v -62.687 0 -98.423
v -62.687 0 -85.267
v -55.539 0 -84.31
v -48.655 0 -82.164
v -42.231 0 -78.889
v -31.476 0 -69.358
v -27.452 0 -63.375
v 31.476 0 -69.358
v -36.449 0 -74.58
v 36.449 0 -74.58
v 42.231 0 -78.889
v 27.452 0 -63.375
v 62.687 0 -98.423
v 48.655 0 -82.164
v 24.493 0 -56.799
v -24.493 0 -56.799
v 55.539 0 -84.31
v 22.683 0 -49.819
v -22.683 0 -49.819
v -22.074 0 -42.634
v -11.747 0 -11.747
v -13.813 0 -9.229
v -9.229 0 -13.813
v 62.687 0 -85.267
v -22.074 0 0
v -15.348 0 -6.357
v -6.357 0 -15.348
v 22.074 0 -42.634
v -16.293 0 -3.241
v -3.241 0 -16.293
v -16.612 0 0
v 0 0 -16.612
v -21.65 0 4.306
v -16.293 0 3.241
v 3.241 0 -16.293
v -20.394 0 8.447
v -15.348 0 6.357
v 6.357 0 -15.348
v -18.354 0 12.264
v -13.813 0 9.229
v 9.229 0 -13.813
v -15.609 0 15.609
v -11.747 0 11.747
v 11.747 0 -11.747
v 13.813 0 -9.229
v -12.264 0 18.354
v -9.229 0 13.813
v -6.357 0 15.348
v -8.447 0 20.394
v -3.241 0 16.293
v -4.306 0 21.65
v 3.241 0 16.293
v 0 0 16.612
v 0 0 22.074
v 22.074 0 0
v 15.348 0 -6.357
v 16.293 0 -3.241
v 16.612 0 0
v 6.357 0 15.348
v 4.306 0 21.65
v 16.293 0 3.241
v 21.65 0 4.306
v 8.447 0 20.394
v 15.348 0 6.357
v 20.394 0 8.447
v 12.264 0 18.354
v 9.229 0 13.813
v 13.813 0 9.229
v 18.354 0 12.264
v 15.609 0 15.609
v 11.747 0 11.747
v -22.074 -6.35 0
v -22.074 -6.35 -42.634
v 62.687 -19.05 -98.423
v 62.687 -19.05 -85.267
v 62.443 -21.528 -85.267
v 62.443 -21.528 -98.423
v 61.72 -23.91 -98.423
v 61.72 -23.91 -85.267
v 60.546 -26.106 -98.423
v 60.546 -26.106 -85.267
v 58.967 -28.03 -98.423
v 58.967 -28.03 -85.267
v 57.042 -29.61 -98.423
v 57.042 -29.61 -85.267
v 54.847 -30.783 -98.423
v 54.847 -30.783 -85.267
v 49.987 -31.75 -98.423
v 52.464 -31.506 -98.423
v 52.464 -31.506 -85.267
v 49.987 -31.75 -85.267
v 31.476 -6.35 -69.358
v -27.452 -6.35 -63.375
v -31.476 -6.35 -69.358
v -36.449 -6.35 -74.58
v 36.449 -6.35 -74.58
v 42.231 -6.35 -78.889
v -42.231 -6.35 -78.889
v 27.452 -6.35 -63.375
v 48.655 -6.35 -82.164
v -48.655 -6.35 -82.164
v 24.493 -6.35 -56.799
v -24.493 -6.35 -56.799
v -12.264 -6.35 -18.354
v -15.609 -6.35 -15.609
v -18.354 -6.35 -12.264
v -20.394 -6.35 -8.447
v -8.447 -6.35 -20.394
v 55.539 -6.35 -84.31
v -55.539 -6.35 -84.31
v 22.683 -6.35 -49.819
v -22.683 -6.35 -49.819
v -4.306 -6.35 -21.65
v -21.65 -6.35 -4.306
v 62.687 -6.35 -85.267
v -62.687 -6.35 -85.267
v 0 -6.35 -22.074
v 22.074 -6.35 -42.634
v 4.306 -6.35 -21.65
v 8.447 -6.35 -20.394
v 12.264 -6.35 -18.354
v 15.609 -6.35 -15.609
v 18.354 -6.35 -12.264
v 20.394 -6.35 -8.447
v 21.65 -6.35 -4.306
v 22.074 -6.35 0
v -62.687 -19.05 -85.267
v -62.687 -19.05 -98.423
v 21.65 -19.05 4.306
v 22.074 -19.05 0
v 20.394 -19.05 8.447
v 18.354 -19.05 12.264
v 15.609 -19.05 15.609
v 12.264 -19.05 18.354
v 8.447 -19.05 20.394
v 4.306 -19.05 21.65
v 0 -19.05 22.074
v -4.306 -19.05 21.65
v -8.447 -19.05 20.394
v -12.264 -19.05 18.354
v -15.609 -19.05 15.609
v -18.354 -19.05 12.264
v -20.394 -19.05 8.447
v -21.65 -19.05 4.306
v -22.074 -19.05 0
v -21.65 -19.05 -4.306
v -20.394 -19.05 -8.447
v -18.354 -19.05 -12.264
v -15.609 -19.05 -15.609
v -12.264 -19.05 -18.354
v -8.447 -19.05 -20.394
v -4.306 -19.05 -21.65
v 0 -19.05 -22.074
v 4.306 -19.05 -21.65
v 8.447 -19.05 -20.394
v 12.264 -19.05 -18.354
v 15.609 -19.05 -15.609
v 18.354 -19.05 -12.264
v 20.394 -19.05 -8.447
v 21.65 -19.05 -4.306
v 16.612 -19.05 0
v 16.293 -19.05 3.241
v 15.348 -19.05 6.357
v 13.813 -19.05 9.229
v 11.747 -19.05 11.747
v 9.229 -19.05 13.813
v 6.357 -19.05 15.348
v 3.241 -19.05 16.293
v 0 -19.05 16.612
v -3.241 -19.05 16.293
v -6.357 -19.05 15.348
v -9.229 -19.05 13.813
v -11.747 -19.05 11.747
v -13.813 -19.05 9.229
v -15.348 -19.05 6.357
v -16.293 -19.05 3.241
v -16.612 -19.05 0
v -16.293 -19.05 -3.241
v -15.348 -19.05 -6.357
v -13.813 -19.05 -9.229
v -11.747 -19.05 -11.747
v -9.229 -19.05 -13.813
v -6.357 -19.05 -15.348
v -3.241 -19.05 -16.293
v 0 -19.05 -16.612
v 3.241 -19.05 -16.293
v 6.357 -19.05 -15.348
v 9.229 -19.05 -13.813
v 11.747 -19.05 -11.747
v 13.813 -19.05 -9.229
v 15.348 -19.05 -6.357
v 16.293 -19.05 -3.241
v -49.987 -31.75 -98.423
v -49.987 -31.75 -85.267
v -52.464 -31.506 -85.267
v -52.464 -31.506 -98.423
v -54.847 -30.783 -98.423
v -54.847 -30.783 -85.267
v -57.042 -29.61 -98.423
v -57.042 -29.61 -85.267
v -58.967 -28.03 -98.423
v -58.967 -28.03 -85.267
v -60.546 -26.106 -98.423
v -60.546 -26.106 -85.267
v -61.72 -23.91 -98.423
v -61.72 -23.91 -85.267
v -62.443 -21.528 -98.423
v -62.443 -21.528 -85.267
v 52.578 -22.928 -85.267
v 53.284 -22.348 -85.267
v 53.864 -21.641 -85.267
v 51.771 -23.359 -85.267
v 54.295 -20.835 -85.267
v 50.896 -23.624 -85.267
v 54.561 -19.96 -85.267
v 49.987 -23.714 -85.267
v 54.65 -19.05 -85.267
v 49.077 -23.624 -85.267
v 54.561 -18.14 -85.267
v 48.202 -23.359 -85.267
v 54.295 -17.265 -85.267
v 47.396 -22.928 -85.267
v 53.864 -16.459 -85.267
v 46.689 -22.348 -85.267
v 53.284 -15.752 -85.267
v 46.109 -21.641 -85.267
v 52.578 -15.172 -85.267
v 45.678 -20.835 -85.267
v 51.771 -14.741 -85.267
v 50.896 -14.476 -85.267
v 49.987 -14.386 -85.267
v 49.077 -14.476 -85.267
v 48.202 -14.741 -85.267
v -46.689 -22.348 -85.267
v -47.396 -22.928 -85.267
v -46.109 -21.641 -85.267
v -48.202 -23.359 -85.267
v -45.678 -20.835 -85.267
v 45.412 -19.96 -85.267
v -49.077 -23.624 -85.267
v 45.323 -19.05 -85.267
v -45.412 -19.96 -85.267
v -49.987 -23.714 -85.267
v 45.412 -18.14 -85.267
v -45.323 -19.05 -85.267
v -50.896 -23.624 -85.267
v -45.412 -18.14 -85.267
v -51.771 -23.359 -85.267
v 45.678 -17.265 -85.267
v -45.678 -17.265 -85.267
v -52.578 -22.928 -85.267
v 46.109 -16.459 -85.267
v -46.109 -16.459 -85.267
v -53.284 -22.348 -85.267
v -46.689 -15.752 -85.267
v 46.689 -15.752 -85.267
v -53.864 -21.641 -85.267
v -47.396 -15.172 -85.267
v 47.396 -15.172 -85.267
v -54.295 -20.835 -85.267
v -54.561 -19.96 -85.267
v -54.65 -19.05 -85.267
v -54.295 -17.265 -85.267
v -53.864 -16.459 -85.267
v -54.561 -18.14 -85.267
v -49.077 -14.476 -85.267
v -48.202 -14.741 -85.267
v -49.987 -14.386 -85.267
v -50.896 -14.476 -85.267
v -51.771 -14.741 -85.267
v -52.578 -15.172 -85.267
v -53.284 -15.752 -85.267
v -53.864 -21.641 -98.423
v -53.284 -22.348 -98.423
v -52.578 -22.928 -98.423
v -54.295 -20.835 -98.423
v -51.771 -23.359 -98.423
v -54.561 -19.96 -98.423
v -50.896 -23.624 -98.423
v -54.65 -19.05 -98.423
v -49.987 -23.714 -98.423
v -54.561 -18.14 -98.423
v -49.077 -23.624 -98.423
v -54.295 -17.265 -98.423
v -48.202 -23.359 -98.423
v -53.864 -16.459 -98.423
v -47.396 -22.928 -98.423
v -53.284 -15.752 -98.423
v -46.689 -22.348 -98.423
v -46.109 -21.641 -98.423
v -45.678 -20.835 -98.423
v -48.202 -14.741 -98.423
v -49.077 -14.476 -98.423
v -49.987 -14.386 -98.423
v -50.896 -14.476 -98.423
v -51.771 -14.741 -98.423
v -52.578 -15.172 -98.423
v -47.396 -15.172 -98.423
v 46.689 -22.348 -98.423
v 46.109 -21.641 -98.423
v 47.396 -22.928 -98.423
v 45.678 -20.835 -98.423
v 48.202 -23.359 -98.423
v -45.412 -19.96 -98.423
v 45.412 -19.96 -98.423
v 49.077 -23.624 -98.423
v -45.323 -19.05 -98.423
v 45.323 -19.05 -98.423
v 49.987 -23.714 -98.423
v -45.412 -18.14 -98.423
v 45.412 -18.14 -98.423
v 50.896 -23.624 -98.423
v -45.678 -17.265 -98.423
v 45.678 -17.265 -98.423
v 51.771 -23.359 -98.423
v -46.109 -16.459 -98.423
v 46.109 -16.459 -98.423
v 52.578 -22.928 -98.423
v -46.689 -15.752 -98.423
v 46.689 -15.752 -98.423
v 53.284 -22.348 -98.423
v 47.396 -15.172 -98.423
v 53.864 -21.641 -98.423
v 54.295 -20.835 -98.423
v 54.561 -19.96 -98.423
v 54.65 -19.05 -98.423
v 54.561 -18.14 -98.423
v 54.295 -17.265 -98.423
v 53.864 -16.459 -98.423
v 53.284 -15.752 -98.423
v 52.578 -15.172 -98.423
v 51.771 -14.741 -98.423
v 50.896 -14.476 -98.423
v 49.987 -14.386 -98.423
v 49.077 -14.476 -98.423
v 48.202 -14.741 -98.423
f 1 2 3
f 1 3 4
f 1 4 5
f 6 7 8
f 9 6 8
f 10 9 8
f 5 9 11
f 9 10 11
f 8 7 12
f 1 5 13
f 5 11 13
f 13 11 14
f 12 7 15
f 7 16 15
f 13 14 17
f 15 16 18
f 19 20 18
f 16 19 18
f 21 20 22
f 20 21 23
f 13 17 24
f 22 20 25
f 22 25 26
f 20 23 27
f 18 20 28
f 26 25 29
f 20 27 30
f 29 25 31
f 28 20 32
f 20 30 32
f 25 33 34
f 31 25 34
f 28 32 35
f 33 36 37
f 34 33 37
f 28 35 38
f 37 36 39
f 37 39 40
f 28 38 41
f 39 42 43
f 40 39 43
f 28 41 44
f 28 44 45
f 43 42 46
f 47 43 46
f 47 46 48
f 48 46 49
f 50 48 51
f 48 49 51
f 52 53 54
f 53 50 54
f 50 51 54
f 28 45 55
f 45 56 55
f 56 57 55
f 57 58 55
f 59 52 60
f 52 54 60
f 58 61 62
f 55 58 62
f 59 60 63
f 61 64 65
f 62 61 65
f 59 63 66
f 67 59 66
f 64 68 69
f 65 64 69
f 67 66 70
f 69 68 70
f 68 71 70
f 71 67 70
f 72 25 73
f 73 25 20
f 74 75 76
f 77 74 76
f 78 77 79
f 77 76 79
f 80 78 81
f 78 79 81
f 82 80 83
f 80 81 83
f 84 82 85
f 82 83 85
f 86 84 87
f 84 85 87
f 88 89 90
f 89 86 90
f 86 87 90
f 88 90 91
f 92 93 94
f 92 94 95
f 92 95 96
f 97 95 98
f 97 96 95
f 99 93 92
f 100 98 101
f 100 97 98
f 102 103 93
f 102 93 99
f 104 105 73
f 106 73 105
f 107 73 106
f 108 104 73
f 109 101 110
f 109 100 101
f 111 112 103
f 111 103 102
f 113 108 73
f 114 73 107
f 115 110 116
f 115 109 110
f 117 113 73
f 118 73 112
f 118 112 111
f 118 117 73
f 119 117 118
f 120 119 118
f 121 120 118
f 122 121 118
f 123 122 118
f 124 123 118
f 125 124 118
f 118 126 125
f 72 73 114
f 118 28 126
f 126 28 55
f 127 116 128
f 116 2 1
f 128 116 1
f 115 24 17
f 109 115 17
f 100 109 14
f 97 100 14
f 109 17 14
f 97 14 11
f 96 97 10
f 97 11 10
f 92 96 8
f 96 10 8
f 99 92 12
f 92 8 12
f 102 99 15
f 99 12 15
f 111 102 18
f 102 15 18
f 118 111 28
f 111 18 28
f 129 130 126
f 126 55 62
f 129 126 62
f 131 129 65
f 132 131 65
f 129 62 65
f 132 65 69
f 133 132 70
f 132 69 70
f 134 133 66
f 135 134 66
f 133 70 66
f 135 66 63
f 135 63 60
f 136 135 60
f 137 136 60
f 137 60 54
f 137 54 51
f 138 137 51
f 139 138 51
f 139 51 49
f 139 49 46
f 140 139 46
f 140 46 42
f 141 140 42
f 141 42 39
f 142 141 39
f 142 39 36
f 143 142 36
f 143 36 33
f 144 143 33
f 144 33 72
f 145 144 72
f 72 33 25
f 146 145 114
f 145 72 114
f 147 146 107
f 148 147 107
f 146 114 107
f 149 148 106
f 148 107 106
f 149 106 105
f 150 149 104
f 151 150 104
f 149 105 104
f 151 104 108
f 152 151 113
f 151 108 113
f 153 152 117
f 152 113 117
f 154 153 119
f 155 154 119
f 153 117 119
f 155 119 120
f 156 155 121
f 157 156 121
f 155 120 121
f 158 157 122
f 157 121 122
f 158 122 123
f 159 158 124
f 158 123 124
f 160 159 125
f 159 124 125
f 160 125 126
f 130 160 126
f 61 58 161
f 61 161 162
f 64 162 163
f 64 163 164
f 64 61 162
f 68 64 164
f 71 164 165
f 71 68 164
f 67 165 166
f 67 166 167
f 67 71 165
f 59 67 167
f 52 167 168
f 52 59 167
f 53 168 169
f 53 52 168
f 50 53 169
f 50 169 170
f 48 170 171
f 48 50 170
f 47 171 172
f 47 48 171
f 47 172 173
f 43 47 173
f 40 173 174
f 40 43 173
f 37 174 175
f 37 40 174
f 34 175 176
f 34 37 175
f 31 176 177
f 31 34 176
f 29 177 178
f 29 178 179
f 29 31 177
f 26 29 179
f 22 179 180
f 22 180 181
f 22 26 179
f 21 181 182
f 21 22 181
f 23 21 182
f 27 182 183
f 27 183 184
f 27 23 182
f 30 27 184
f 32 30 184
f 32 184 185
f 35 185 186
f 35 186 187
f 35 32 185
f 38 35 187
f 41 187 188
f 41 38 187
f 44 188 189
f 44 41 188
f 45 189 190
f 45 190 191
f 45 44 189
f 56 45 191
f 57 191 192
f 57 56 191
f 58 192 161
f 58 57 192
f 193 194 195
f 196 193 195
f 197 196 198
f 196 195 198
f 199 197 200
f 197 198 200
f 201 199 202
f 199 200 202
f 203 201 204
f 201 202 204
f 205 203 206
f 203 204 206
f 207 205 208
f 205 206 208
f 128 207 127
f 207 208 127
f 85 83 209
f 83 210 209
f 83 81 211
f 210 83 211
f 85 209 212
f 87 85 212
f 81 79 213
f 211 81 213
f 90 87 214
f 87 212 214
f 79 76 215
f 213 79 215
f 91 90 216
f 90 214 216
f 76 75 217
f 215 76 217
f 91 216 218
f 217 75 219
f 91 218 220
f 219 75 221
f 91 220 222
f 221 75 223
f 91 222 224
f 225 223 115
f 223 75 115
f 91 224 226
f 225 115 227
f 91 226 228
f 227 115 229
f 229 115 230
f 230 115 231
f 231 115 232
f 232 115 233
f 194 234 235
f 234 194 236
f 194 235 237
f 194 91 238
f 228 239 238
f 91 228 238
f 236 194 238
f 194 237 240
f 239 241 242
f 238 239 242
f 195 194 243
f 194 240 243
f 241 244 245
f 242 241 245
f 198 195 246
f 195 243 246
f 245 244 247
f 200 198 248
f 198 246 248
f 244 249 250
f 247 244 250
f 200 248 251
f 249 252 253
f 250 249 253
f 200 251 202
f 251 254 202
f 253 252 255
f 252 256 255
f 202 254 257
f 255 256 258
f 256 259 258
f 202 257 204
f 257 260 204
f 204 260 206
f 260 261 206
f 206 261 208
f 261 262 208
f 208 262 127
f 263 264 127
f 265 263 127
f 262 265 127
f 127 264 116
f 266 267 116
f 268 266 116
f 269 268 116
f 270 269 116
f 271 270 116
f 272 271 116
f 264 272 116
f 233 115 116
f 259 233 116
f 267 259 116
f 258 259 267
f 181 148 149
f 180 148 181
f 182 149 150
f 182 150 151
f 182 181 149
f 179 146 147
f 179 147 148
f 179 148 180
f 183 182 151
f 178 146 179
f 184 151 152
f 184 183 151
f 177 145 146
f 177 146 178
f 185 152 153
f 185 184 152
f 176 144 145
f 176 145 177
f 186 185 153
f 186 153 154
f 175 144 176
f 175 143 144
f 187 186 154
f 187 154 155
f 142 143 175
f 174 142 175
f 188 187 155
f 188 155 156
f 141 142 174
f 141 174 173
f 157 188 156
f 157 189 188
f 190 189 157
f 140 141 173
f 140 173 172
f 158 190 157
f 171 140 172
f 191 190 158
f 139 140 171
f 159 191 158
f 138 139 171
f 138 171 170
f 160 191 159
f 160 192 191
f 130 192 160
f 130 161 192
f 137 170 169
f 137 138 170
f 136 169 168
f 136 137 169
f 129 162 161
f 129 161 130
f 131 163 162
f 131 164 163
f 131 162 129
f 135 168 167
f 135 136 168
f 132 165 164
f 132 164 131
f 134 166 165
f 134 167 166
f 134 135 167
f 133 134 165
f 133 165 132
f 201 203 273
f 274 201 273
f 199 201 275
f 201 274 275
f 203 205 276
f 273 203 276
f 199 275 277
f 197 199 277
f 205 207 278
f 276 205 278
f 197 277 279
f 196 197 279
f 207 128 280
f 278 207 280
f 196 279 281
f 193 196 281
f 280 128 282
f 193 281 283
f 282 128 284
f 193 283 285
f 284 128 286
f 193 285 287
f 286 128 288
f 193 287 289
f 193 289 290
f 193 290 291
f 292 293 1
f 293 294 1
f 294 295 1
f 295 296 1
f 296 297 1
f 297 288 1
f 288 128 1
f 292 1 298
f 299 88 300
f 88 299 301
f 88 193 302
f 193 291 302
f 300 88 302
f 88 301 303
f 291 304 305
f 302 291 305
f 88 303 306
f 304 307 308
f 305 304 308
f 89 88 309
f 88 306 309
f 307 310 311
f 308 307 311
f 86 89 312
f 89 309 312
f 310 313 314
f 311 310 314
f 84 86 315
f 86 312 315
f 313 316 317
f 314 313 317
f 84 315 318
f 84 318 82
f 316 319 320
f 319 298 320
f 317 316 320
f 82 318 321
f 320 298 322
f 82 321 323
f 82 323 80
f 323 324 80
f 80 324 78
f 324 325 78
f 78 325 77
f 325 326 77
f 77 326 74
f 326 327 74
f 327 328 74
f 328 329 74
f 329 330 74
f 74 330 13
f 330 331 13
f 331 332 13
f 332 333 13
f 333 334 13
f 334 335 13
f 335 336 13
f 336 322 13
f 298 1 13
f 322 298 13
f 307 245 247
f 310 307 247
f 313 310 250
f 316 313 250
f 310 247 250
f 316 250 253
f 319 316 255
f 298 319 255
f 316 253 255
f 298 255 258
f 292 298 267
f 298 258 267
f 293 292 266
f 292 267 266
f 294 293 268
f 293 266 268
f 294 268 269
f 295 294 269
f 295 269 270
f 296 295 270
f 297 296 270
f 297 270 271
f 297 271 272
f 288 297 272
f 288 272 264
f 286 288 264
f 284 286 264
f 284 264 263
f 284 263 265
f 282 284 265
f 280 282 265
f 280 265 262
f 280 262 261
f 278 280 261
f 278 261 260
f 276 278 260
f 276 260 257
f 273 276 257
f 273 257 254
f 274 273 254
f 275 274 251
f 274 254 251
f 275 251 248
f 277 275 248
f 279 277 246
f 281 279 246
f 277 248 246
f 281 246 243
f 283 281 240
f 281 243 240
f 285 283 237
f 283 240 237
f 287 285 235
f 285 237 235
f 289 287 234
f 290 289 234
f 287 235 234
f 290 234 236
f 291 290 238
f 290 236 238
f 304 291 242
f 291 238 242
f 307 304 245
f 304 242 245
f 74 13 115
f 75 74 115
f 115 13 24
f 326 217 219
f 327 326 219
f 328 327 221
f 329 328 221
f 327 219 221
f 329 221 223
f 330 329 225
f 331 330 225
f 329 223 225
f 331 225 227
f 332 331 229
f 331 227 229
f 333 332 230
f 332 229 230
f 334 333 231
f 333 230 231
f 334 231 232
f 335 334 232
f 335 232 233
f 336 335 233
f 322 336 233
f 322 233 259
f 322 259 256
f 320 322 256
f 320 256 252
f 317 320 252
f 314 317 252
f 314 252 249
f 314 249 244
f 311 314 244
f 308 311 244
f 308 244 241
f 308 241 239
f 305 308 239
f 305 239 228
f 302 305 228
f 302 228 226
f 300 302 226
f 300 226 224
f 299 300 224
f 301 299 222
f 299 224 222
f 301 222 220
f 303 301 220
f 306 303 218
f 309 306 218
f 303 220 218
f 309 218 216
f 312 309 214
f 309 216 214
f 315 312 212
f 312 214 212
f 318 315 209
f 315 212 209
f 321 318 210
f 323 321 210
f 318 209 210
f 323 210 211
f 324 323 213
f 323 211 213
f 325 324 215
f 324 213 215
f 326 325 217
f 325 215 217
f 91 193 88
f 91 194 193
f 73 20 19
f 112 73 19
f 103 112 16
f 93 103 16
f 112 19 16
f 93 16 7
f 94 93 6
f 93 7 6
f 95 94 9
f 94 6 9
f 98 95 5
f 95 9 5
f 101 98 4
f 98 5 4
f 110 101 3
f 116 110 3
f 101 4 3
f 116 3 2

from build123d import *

# Parameters (mm, degrees)
F1_DEPTH = 6.35
F0_R     = 16.612306
F2_DEPTH = 19.05
F3_DEPTH = 31.75
F4_R     = 4.66369
F5_DEPTH = 13.156878


with BuildPart() as f1:
    # F0 (on Front) → F1 (new body)
    with BuildSketch(Plane.XZ):
        with BuildLine():
            Line((22.07386, -42.633548), (22.07386, 0))
            ThreePointArc((22.07386, 0), (0, -22.07386), (-22.07386, 0))
            Line((-22.07386, 0), (-22.07386, -42.633548))
            ThreePointArc((-22.07386, -42.633548), (-33.852086, -72.074216), (-62.68657, -85.267097))
            Line((-62.68657, -85.267097), (-22.07386, -85.267097))
            Line((-22.07386, -85.267097), (22.07386, -85.267097))
            Line((22.07386, -85.267097), (62.68657, -85.267097))
            ThreePointArc((62.68657, -85.267097), (33.852086, -72.074216), (22.07386, -42.633548))
        make_face()
    extrude(amount=F1_DEPTH)

    # F0 (on Front) → F2 (join)
    with BuildSketch(Plane.XZ):
        with BuildLine():
            ThreePointArc((-22.07386, 0), (0, -22.07386), (22.07386, 0))
            ThreePointArc((22.07386, 0), (0, 22.07386), (-22.07386, 0))
        make_face()
        Circle(F0_R, mode=Mode.SUBTRACT)
    extrude(amount=F2_DEPTH)

    # F0 (on Front) → F3 (join)
    with BuildSketch(Plane.XZ):
        Polygon((62.68657, -98.422974), (62.68657, -85.267097), (22.07386, -85.267097), (-22.07386, -85.267097), (-62.68657, -85.267097), (-62.68657, -98.422974), align=None)
    extrude(amount=F3_DEPTH)

    # F4 (on face) → F5 (cut, through all)
    with BuildSketch(Plane.XY.offset(-85.267097)):
        with Locations((-49.98657, -19.05)):
            Circle(F4_R)
        with Locations((49.98657, -19.05)):
            Circle(F4_R)
        with BuildLine():
            Line((-62.68657, -19.05), (-62.68657, -31.75))
            Line((-62.68657, -31.75), (-49.98657, -31.75))
            ThreePointArc((-49.98657, -31.75), (-58.966826, -28.030256), (-62.68657, -19.05))
        make_face()
        with BuildLine():
            ThreePointArc((62.68657, -19.05), (58.966826, -28.030256), (49.98657, -31.75))
            Line((49.98657, -31.75), (62.68657, -31.75))
            Line((62.68657, -31.75), (62.68657, -19.05))
        make_face()
    extrude(amount=-F5_DEPTH, mode=Mode.SUBTRACT)


solid = f1.part
